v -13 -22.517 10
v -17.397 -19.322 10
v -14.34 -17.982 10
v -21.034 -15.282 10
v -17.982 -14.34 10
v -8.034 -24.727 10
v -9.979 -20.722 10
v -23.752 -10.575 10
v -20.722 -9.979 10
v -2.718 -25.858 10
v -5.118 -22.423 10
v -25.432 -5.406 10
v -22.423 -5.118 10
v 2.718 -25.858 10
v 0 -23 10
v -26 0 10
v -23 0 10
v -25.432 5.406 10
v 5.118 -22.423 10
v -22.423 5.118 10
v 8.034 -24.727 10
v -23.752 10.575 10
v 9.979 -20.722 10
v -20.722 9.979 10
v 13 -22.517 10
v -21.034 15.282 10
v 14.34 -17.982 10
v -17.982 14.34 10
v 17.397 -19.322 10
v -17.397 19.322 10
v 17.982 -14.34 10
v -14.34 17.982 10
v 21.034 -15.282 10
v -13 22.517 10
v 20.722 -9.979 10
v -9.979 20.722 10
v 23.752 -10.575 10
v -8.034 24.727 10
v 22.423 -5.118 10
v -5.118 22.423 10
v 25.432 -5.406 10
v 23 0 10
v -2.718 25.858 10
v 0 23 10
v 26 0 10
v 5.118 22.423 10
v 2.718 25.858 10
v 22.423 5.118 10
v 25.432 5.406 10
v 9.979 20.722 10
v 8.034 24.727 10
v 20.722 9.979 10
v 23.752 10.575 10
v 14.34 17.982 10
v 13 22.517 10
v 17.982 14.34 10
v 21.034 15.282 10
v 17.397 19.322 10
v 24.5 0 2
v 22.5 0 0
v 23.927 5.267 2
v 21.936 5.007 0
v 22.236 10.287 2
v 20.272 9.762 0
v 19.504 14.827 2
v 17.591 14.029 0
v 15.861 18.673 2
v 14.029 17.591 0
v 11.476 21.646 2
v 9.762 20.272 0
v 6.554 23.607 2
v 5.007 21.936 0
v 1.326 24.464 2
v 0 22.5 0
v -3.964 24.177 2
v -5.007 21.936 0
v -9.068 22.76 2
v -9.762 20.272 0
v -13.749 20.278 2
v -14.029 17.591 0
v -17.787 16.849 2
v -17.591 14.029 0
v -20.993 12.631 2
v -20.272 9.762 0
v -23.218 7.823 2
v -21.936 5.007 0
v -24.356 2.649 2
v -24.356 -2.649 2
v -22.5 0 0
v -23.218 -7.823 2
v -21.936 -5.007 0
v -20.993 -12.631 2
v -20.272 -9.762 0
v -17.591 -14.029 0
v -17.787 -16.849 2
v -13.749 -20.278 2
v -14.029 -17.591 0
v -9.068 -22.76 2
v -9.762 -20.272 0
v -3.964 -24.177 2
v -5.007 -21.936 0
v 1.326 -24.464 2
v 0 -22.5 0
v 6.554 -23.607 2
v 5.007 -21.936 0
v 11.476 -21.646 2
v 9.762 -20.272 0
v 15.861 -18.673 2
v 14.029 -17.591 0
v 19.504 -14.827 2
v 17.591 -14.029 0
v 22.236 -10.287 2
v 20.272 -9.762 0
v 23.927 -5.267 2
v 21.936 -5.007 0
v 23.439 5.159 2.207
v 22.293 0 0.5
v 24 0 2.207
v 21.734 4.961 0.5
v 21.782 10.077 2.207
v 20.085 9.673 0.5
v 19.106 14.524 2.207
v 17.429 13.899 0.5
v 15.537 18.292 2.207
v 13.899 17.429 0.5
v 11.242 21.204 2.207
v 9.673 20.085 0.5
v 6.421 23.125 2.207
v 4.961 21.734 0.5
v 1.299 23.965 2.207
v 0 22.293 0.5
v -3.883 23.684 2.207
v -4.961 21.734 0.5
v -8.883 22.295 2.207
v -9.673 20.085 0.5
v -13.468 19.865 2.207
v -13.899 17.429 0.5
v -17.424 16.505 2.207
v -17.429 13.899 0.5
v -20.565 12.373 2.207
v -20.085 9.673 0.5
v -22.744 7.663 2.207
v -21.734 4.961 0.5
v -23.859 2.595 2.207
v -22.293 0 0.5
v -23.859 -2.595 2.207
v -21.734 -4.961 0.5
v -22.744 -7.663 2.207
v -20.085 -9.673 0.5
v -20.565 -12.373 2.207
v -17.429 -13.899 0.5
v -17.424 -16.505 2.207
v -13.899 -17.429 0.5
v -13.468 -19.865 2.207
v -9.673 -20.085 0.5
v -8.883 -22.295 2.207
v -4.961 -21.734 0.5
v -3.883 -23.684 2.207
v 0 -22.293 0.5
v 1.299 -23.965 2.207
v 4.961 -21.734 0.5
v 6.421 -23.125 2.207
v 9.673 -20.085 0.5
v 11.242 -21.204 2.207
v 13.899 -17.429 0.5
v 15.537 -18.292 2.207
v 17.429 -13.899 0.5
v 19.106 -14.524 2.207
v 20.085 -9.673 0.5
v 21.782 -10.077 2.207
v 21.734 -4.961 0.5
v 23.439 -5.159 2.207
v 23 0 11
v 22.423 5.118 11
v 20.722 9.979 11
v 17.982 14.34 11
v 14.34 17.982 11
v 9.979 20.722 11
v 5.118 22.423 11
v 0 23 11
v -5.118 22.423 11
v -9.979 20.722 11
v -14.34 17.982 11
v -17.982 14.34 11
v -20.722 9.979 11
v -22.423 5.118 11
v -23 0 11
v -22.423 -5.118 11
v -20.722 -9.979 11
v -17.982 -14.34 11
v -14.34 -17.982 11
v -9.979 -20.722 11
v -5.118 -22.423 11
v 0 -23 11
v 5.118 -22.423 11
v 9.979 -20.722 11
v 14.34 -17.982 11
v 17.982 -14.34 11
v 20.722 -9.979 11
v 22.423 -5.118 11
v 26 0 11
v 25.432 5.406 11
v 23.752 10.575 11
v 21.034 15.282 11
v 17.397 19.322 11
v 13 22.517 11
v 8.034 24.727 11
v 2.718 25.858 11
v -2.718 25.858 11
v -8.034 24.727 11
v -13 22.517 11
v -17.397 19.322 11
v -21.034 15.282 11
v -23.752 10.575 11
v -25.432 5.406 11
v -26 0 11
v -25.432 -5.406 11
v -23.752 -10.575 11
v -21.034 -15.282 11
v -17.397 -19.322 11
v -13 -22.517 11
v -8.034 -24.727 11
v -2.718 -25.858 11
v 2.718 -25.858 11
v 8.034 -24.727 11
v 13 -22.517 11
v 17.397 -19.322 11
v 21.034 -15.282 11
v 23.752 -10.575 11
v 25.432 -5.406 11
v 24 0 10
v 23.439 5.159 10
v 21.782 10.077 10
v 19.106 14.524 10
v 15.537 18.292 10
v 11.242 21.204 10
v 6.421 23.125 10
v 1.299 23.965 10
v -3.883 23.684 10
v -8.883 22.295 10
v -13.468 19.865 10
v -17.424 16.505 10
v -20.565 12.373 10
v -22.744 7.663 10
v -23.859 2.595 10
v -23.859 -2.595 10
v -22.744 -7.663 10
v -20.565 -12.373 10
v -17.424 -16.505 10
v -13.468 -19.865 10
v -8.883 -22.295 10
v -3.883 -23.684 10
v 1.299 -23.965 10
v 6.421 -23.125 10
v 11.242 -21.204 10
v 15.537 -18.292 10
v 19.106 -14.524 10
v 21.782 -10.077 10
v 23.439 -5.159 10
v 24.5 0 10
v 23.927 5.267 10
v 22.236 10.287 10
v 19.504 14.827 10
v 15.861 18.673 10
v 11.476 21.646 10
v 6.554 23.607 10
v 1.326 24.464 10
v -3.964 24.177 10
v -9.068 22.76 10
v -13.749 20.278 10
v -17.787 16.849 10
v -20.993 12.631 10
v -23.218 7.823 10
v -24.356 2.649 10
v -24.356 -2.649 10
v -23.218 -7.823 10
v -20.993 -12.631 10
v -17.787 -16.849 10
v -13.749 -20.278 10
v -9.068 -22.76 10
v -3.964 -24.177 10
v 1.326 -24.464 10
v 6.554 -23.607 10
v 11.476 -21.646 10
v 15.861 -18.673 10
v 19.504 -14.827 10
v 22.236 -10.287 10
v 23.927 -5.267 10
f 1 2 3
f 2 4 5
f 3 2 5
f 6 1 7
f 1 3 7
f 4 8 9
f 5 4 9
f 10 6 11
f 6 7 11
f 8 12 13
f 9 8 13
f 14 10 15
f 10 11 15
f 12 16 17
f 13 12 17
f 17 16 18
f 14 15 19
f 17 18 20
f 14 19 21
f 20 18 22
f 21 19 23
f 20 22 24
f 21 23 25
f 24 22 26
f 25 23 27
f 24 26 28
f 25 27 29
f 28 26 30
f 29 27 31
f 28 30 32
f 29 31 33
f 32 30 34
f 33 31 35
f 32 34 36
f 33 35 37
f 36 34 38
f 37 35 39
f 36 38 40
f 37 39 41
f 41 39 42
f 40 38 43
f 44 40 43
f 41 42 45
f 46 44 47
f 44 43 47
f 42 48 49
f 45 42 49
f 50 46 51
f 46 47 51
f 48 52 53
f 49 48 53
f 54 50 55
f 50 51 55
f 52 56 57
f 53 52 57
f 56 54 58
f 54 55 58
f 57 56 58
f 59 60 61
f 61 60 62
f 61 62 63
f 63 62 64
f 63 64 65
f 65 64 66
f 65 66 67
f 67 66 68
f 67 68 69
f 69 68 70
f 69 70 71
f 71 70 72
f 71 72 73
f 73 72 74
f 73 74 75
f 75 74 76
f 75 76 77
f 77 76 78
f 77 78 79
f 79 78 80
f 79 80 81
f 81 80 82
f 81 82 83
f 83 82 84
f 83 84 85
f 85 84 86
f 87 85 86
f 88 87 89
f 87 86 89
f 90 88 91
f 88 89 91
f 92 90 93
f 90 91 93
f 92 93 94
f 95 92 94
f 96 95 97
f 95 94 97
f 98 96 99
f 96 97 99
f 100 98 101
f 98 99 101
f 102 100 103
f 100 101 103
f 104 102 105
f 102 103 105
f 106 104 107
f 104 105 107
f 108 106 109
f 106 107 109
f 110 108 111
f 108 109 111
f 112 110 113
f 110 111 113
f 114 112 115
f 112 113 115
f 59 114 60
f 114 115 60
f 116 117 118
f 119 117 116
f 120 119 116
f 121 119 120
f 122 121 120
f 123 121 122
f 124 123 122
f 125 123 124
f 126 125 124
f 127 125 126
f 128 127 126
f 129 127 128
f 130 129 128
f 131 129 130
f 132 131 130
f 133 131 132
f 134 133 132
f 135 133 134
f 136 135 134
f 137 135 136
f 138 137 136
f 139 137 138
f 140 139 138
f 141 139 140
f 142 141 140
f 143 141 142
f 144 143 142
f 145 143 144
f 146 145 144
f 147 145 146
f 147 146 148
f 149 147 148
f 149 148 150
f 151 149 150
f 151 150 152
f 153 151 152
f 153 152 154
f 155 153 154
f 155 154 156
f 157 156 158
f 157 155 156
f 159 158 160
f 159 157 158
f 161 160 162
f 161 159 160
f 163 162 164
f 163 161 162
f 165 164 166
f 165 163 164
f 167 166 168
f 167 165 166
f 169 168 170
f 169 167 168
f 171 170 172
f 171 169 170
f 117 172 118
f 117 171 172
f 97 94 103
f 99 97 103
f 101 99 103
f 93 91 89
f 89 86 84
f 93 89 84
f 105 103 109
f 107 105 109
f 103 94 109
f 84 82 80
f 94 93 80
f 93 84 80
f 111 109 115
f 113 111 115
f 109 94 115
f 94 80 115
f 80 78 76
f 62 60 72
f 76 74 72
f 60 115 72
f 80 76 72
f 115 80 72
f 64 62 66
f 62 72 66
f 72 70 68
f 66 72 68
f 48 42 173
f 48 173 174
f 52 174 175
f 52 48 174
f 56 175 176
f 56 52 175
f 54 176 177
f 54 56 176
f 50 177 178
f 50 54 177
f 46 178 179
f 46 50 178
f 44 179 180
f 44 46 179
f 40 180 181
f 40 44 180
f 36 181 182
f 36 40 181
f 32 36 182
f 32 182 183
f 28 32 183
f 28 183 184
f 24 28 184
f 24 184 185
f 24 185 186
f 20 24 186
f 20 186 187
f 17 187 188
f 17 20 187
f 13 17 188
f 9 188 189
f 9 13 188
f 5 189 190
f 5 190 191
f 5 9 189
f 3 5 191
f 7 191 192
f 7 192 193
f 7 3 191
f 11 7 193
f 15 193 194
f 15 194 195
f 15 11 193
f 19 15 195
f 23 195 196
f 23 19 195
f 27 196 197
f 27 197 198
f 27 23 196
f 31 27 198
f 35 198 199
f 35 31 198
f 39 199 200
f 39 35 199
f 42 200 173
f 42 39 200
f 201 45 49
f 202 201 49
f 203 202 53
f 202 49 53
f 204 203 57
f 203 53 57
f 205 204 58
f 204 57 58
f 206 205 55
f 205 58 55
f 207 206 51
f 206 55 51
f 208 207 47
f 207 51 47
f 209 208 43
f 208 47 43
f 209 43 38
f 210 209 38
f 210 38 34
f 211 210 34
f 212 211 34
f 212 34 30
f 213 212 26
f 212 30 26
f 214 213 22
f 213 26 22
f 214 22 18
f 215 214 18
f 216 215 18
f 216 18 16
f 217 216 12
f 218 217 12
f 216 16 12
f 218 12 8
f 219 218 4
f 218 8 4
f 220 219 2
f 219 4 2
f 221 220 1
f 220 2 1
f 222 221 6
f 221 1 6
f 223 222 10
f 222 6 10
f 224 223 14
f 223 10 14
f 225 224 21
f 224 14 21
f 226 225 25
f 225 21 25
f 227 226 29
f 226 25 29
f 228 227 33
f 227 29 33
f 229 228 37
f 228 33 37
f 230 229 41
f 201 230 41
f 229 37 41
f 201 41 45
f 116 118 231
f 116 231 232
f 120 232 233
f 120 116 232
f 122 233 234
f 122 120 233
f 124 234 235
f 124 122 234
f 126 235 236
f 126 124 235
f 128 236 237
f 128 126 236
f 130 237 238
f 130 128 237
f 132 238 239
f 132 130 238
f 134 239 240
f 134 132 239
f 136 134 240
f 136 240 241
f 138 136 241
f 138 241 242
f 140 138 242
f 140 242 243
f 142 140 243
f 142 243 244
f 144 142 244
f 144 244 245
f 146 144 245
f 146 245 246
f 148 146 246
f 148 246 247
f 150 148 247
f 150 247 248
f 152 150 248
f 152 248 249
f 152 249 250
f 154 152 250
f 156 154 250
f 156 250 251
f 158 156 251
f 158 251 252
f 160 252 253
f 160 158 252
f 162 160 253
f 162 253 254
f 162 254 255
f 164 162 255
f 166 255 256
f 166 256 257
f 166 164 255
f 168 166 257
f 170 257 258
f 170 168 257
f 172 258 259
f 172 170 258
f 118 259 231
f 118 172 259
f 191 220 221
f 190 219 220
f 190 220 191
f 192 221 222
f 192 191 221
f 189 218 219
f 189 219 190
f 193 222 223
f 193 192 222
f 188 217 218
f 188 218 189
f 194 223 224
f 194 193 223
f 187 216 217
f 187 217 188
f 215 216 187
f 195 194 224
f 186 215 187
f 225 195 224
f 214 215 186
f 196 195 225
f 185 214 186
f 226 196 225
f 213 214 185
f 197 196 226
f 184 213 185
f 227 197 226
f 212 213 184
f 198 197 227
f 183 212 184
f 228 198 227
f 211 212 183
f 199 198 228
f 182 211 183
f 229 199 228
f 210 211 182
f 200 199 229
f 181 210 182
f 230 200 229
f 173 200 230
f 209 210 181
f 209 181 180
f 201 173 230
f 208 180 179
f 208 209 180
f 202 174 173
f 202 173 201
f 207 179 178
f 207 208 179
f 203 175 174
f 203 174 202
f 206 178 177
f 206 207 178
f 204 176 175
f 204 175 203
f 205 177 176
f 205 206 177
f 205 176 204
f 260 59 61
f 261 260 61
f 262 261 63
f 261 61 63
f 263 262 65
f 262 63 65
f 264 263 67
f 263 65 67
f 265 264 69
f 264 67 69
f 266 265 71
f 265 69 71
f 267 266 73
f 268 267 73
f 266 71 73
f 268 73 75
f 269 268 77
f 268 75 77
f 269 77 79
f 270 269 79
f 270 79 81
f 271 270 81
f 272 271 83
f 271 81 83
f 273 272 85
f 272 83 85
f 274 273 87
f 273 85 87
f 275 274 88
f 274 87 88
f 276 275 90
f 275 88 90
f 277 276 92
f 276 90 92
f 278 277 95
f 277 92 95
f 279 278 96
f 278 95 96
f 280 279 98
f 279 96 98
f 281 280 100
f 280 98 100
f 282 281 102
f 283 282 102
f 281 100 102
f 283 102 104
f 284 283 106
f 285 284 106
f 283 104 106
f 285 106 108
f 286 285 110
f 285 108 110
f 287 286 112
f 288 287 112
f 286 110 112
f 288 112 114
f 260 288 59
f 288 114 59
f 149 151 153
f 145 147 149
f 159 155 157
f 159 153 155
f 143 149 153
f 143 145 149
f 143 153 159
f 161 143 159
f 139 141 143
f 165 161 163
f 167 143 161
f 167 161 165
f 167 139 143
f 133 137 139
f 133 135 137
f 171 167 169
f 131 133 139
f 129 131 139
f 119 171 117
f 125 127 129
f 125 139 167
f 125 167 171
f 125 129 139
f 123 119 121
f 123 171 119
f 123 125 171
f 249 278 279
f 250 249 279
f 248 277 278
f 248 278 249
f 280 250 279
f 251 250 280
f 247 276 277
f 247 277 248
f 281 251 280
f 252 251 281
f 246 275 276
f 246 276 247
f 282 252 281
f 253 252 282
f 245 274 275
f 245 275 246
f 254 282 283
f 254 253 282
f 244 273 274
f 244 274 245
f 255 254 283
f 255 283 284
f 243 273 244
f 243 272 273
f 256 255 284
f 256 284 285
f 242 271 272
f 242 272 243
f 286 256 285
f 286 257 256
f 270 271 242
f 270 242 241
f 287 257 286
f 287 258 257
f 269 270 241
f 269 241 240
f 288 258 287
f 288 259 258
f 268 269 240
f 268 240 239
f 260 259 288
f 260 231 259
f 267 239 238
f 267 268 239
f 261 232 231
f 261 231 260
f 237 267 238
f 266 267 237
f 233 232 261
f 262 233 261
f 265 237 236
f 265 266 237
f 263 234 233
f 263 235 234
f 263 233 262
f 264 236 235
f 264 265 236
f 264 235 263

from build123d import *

# Parameters (mm, degrees)
SKETCH001_R   = 26
SKETCH001_R_2 = 23
PAD001_DEPTH  = 1
SKETCH_R      = 24.5
PAD_DEPTH     = 10
CHAMFER_SIZE  = 2
THICKNESS_T   = -0.5


with BuildPart() as pad001:
    # Sketch001 → Pad001 (new body)
    with BuildSketch(Plane.XY.offset(10)):
        Circle(SKETCH001_R)
        Circle(SKETCH001_R_2, mode=Mode.SUBTRACT)
    extrude(amount=PAD001_DEPTH)


with BuildPart() as thickness:
    # Sketch → Pad (new body)
    with BuildSketch(Plane.XY):
        Circle(SKETCH_R)
    extrude(amount=PAD_DEPTH)

    # Chamfer
    chamfer_edges = [thickness.edges().sort_by_distance(p)[0] for p in [
        (-24.5, 0, 0),
    ]]
    chamfer(chamfer_edges, length=CHAMFER_SIZE)

    # Thickness
    thickness_openings = [thickness.faces().sort_by_distance(p)[0] for p in [
        (0, 0, 10),
    ]]
    offset(amount=THICKNESS_T, openings=thickness_openings)


solid = Compound([pad001.part, thickness.part])
